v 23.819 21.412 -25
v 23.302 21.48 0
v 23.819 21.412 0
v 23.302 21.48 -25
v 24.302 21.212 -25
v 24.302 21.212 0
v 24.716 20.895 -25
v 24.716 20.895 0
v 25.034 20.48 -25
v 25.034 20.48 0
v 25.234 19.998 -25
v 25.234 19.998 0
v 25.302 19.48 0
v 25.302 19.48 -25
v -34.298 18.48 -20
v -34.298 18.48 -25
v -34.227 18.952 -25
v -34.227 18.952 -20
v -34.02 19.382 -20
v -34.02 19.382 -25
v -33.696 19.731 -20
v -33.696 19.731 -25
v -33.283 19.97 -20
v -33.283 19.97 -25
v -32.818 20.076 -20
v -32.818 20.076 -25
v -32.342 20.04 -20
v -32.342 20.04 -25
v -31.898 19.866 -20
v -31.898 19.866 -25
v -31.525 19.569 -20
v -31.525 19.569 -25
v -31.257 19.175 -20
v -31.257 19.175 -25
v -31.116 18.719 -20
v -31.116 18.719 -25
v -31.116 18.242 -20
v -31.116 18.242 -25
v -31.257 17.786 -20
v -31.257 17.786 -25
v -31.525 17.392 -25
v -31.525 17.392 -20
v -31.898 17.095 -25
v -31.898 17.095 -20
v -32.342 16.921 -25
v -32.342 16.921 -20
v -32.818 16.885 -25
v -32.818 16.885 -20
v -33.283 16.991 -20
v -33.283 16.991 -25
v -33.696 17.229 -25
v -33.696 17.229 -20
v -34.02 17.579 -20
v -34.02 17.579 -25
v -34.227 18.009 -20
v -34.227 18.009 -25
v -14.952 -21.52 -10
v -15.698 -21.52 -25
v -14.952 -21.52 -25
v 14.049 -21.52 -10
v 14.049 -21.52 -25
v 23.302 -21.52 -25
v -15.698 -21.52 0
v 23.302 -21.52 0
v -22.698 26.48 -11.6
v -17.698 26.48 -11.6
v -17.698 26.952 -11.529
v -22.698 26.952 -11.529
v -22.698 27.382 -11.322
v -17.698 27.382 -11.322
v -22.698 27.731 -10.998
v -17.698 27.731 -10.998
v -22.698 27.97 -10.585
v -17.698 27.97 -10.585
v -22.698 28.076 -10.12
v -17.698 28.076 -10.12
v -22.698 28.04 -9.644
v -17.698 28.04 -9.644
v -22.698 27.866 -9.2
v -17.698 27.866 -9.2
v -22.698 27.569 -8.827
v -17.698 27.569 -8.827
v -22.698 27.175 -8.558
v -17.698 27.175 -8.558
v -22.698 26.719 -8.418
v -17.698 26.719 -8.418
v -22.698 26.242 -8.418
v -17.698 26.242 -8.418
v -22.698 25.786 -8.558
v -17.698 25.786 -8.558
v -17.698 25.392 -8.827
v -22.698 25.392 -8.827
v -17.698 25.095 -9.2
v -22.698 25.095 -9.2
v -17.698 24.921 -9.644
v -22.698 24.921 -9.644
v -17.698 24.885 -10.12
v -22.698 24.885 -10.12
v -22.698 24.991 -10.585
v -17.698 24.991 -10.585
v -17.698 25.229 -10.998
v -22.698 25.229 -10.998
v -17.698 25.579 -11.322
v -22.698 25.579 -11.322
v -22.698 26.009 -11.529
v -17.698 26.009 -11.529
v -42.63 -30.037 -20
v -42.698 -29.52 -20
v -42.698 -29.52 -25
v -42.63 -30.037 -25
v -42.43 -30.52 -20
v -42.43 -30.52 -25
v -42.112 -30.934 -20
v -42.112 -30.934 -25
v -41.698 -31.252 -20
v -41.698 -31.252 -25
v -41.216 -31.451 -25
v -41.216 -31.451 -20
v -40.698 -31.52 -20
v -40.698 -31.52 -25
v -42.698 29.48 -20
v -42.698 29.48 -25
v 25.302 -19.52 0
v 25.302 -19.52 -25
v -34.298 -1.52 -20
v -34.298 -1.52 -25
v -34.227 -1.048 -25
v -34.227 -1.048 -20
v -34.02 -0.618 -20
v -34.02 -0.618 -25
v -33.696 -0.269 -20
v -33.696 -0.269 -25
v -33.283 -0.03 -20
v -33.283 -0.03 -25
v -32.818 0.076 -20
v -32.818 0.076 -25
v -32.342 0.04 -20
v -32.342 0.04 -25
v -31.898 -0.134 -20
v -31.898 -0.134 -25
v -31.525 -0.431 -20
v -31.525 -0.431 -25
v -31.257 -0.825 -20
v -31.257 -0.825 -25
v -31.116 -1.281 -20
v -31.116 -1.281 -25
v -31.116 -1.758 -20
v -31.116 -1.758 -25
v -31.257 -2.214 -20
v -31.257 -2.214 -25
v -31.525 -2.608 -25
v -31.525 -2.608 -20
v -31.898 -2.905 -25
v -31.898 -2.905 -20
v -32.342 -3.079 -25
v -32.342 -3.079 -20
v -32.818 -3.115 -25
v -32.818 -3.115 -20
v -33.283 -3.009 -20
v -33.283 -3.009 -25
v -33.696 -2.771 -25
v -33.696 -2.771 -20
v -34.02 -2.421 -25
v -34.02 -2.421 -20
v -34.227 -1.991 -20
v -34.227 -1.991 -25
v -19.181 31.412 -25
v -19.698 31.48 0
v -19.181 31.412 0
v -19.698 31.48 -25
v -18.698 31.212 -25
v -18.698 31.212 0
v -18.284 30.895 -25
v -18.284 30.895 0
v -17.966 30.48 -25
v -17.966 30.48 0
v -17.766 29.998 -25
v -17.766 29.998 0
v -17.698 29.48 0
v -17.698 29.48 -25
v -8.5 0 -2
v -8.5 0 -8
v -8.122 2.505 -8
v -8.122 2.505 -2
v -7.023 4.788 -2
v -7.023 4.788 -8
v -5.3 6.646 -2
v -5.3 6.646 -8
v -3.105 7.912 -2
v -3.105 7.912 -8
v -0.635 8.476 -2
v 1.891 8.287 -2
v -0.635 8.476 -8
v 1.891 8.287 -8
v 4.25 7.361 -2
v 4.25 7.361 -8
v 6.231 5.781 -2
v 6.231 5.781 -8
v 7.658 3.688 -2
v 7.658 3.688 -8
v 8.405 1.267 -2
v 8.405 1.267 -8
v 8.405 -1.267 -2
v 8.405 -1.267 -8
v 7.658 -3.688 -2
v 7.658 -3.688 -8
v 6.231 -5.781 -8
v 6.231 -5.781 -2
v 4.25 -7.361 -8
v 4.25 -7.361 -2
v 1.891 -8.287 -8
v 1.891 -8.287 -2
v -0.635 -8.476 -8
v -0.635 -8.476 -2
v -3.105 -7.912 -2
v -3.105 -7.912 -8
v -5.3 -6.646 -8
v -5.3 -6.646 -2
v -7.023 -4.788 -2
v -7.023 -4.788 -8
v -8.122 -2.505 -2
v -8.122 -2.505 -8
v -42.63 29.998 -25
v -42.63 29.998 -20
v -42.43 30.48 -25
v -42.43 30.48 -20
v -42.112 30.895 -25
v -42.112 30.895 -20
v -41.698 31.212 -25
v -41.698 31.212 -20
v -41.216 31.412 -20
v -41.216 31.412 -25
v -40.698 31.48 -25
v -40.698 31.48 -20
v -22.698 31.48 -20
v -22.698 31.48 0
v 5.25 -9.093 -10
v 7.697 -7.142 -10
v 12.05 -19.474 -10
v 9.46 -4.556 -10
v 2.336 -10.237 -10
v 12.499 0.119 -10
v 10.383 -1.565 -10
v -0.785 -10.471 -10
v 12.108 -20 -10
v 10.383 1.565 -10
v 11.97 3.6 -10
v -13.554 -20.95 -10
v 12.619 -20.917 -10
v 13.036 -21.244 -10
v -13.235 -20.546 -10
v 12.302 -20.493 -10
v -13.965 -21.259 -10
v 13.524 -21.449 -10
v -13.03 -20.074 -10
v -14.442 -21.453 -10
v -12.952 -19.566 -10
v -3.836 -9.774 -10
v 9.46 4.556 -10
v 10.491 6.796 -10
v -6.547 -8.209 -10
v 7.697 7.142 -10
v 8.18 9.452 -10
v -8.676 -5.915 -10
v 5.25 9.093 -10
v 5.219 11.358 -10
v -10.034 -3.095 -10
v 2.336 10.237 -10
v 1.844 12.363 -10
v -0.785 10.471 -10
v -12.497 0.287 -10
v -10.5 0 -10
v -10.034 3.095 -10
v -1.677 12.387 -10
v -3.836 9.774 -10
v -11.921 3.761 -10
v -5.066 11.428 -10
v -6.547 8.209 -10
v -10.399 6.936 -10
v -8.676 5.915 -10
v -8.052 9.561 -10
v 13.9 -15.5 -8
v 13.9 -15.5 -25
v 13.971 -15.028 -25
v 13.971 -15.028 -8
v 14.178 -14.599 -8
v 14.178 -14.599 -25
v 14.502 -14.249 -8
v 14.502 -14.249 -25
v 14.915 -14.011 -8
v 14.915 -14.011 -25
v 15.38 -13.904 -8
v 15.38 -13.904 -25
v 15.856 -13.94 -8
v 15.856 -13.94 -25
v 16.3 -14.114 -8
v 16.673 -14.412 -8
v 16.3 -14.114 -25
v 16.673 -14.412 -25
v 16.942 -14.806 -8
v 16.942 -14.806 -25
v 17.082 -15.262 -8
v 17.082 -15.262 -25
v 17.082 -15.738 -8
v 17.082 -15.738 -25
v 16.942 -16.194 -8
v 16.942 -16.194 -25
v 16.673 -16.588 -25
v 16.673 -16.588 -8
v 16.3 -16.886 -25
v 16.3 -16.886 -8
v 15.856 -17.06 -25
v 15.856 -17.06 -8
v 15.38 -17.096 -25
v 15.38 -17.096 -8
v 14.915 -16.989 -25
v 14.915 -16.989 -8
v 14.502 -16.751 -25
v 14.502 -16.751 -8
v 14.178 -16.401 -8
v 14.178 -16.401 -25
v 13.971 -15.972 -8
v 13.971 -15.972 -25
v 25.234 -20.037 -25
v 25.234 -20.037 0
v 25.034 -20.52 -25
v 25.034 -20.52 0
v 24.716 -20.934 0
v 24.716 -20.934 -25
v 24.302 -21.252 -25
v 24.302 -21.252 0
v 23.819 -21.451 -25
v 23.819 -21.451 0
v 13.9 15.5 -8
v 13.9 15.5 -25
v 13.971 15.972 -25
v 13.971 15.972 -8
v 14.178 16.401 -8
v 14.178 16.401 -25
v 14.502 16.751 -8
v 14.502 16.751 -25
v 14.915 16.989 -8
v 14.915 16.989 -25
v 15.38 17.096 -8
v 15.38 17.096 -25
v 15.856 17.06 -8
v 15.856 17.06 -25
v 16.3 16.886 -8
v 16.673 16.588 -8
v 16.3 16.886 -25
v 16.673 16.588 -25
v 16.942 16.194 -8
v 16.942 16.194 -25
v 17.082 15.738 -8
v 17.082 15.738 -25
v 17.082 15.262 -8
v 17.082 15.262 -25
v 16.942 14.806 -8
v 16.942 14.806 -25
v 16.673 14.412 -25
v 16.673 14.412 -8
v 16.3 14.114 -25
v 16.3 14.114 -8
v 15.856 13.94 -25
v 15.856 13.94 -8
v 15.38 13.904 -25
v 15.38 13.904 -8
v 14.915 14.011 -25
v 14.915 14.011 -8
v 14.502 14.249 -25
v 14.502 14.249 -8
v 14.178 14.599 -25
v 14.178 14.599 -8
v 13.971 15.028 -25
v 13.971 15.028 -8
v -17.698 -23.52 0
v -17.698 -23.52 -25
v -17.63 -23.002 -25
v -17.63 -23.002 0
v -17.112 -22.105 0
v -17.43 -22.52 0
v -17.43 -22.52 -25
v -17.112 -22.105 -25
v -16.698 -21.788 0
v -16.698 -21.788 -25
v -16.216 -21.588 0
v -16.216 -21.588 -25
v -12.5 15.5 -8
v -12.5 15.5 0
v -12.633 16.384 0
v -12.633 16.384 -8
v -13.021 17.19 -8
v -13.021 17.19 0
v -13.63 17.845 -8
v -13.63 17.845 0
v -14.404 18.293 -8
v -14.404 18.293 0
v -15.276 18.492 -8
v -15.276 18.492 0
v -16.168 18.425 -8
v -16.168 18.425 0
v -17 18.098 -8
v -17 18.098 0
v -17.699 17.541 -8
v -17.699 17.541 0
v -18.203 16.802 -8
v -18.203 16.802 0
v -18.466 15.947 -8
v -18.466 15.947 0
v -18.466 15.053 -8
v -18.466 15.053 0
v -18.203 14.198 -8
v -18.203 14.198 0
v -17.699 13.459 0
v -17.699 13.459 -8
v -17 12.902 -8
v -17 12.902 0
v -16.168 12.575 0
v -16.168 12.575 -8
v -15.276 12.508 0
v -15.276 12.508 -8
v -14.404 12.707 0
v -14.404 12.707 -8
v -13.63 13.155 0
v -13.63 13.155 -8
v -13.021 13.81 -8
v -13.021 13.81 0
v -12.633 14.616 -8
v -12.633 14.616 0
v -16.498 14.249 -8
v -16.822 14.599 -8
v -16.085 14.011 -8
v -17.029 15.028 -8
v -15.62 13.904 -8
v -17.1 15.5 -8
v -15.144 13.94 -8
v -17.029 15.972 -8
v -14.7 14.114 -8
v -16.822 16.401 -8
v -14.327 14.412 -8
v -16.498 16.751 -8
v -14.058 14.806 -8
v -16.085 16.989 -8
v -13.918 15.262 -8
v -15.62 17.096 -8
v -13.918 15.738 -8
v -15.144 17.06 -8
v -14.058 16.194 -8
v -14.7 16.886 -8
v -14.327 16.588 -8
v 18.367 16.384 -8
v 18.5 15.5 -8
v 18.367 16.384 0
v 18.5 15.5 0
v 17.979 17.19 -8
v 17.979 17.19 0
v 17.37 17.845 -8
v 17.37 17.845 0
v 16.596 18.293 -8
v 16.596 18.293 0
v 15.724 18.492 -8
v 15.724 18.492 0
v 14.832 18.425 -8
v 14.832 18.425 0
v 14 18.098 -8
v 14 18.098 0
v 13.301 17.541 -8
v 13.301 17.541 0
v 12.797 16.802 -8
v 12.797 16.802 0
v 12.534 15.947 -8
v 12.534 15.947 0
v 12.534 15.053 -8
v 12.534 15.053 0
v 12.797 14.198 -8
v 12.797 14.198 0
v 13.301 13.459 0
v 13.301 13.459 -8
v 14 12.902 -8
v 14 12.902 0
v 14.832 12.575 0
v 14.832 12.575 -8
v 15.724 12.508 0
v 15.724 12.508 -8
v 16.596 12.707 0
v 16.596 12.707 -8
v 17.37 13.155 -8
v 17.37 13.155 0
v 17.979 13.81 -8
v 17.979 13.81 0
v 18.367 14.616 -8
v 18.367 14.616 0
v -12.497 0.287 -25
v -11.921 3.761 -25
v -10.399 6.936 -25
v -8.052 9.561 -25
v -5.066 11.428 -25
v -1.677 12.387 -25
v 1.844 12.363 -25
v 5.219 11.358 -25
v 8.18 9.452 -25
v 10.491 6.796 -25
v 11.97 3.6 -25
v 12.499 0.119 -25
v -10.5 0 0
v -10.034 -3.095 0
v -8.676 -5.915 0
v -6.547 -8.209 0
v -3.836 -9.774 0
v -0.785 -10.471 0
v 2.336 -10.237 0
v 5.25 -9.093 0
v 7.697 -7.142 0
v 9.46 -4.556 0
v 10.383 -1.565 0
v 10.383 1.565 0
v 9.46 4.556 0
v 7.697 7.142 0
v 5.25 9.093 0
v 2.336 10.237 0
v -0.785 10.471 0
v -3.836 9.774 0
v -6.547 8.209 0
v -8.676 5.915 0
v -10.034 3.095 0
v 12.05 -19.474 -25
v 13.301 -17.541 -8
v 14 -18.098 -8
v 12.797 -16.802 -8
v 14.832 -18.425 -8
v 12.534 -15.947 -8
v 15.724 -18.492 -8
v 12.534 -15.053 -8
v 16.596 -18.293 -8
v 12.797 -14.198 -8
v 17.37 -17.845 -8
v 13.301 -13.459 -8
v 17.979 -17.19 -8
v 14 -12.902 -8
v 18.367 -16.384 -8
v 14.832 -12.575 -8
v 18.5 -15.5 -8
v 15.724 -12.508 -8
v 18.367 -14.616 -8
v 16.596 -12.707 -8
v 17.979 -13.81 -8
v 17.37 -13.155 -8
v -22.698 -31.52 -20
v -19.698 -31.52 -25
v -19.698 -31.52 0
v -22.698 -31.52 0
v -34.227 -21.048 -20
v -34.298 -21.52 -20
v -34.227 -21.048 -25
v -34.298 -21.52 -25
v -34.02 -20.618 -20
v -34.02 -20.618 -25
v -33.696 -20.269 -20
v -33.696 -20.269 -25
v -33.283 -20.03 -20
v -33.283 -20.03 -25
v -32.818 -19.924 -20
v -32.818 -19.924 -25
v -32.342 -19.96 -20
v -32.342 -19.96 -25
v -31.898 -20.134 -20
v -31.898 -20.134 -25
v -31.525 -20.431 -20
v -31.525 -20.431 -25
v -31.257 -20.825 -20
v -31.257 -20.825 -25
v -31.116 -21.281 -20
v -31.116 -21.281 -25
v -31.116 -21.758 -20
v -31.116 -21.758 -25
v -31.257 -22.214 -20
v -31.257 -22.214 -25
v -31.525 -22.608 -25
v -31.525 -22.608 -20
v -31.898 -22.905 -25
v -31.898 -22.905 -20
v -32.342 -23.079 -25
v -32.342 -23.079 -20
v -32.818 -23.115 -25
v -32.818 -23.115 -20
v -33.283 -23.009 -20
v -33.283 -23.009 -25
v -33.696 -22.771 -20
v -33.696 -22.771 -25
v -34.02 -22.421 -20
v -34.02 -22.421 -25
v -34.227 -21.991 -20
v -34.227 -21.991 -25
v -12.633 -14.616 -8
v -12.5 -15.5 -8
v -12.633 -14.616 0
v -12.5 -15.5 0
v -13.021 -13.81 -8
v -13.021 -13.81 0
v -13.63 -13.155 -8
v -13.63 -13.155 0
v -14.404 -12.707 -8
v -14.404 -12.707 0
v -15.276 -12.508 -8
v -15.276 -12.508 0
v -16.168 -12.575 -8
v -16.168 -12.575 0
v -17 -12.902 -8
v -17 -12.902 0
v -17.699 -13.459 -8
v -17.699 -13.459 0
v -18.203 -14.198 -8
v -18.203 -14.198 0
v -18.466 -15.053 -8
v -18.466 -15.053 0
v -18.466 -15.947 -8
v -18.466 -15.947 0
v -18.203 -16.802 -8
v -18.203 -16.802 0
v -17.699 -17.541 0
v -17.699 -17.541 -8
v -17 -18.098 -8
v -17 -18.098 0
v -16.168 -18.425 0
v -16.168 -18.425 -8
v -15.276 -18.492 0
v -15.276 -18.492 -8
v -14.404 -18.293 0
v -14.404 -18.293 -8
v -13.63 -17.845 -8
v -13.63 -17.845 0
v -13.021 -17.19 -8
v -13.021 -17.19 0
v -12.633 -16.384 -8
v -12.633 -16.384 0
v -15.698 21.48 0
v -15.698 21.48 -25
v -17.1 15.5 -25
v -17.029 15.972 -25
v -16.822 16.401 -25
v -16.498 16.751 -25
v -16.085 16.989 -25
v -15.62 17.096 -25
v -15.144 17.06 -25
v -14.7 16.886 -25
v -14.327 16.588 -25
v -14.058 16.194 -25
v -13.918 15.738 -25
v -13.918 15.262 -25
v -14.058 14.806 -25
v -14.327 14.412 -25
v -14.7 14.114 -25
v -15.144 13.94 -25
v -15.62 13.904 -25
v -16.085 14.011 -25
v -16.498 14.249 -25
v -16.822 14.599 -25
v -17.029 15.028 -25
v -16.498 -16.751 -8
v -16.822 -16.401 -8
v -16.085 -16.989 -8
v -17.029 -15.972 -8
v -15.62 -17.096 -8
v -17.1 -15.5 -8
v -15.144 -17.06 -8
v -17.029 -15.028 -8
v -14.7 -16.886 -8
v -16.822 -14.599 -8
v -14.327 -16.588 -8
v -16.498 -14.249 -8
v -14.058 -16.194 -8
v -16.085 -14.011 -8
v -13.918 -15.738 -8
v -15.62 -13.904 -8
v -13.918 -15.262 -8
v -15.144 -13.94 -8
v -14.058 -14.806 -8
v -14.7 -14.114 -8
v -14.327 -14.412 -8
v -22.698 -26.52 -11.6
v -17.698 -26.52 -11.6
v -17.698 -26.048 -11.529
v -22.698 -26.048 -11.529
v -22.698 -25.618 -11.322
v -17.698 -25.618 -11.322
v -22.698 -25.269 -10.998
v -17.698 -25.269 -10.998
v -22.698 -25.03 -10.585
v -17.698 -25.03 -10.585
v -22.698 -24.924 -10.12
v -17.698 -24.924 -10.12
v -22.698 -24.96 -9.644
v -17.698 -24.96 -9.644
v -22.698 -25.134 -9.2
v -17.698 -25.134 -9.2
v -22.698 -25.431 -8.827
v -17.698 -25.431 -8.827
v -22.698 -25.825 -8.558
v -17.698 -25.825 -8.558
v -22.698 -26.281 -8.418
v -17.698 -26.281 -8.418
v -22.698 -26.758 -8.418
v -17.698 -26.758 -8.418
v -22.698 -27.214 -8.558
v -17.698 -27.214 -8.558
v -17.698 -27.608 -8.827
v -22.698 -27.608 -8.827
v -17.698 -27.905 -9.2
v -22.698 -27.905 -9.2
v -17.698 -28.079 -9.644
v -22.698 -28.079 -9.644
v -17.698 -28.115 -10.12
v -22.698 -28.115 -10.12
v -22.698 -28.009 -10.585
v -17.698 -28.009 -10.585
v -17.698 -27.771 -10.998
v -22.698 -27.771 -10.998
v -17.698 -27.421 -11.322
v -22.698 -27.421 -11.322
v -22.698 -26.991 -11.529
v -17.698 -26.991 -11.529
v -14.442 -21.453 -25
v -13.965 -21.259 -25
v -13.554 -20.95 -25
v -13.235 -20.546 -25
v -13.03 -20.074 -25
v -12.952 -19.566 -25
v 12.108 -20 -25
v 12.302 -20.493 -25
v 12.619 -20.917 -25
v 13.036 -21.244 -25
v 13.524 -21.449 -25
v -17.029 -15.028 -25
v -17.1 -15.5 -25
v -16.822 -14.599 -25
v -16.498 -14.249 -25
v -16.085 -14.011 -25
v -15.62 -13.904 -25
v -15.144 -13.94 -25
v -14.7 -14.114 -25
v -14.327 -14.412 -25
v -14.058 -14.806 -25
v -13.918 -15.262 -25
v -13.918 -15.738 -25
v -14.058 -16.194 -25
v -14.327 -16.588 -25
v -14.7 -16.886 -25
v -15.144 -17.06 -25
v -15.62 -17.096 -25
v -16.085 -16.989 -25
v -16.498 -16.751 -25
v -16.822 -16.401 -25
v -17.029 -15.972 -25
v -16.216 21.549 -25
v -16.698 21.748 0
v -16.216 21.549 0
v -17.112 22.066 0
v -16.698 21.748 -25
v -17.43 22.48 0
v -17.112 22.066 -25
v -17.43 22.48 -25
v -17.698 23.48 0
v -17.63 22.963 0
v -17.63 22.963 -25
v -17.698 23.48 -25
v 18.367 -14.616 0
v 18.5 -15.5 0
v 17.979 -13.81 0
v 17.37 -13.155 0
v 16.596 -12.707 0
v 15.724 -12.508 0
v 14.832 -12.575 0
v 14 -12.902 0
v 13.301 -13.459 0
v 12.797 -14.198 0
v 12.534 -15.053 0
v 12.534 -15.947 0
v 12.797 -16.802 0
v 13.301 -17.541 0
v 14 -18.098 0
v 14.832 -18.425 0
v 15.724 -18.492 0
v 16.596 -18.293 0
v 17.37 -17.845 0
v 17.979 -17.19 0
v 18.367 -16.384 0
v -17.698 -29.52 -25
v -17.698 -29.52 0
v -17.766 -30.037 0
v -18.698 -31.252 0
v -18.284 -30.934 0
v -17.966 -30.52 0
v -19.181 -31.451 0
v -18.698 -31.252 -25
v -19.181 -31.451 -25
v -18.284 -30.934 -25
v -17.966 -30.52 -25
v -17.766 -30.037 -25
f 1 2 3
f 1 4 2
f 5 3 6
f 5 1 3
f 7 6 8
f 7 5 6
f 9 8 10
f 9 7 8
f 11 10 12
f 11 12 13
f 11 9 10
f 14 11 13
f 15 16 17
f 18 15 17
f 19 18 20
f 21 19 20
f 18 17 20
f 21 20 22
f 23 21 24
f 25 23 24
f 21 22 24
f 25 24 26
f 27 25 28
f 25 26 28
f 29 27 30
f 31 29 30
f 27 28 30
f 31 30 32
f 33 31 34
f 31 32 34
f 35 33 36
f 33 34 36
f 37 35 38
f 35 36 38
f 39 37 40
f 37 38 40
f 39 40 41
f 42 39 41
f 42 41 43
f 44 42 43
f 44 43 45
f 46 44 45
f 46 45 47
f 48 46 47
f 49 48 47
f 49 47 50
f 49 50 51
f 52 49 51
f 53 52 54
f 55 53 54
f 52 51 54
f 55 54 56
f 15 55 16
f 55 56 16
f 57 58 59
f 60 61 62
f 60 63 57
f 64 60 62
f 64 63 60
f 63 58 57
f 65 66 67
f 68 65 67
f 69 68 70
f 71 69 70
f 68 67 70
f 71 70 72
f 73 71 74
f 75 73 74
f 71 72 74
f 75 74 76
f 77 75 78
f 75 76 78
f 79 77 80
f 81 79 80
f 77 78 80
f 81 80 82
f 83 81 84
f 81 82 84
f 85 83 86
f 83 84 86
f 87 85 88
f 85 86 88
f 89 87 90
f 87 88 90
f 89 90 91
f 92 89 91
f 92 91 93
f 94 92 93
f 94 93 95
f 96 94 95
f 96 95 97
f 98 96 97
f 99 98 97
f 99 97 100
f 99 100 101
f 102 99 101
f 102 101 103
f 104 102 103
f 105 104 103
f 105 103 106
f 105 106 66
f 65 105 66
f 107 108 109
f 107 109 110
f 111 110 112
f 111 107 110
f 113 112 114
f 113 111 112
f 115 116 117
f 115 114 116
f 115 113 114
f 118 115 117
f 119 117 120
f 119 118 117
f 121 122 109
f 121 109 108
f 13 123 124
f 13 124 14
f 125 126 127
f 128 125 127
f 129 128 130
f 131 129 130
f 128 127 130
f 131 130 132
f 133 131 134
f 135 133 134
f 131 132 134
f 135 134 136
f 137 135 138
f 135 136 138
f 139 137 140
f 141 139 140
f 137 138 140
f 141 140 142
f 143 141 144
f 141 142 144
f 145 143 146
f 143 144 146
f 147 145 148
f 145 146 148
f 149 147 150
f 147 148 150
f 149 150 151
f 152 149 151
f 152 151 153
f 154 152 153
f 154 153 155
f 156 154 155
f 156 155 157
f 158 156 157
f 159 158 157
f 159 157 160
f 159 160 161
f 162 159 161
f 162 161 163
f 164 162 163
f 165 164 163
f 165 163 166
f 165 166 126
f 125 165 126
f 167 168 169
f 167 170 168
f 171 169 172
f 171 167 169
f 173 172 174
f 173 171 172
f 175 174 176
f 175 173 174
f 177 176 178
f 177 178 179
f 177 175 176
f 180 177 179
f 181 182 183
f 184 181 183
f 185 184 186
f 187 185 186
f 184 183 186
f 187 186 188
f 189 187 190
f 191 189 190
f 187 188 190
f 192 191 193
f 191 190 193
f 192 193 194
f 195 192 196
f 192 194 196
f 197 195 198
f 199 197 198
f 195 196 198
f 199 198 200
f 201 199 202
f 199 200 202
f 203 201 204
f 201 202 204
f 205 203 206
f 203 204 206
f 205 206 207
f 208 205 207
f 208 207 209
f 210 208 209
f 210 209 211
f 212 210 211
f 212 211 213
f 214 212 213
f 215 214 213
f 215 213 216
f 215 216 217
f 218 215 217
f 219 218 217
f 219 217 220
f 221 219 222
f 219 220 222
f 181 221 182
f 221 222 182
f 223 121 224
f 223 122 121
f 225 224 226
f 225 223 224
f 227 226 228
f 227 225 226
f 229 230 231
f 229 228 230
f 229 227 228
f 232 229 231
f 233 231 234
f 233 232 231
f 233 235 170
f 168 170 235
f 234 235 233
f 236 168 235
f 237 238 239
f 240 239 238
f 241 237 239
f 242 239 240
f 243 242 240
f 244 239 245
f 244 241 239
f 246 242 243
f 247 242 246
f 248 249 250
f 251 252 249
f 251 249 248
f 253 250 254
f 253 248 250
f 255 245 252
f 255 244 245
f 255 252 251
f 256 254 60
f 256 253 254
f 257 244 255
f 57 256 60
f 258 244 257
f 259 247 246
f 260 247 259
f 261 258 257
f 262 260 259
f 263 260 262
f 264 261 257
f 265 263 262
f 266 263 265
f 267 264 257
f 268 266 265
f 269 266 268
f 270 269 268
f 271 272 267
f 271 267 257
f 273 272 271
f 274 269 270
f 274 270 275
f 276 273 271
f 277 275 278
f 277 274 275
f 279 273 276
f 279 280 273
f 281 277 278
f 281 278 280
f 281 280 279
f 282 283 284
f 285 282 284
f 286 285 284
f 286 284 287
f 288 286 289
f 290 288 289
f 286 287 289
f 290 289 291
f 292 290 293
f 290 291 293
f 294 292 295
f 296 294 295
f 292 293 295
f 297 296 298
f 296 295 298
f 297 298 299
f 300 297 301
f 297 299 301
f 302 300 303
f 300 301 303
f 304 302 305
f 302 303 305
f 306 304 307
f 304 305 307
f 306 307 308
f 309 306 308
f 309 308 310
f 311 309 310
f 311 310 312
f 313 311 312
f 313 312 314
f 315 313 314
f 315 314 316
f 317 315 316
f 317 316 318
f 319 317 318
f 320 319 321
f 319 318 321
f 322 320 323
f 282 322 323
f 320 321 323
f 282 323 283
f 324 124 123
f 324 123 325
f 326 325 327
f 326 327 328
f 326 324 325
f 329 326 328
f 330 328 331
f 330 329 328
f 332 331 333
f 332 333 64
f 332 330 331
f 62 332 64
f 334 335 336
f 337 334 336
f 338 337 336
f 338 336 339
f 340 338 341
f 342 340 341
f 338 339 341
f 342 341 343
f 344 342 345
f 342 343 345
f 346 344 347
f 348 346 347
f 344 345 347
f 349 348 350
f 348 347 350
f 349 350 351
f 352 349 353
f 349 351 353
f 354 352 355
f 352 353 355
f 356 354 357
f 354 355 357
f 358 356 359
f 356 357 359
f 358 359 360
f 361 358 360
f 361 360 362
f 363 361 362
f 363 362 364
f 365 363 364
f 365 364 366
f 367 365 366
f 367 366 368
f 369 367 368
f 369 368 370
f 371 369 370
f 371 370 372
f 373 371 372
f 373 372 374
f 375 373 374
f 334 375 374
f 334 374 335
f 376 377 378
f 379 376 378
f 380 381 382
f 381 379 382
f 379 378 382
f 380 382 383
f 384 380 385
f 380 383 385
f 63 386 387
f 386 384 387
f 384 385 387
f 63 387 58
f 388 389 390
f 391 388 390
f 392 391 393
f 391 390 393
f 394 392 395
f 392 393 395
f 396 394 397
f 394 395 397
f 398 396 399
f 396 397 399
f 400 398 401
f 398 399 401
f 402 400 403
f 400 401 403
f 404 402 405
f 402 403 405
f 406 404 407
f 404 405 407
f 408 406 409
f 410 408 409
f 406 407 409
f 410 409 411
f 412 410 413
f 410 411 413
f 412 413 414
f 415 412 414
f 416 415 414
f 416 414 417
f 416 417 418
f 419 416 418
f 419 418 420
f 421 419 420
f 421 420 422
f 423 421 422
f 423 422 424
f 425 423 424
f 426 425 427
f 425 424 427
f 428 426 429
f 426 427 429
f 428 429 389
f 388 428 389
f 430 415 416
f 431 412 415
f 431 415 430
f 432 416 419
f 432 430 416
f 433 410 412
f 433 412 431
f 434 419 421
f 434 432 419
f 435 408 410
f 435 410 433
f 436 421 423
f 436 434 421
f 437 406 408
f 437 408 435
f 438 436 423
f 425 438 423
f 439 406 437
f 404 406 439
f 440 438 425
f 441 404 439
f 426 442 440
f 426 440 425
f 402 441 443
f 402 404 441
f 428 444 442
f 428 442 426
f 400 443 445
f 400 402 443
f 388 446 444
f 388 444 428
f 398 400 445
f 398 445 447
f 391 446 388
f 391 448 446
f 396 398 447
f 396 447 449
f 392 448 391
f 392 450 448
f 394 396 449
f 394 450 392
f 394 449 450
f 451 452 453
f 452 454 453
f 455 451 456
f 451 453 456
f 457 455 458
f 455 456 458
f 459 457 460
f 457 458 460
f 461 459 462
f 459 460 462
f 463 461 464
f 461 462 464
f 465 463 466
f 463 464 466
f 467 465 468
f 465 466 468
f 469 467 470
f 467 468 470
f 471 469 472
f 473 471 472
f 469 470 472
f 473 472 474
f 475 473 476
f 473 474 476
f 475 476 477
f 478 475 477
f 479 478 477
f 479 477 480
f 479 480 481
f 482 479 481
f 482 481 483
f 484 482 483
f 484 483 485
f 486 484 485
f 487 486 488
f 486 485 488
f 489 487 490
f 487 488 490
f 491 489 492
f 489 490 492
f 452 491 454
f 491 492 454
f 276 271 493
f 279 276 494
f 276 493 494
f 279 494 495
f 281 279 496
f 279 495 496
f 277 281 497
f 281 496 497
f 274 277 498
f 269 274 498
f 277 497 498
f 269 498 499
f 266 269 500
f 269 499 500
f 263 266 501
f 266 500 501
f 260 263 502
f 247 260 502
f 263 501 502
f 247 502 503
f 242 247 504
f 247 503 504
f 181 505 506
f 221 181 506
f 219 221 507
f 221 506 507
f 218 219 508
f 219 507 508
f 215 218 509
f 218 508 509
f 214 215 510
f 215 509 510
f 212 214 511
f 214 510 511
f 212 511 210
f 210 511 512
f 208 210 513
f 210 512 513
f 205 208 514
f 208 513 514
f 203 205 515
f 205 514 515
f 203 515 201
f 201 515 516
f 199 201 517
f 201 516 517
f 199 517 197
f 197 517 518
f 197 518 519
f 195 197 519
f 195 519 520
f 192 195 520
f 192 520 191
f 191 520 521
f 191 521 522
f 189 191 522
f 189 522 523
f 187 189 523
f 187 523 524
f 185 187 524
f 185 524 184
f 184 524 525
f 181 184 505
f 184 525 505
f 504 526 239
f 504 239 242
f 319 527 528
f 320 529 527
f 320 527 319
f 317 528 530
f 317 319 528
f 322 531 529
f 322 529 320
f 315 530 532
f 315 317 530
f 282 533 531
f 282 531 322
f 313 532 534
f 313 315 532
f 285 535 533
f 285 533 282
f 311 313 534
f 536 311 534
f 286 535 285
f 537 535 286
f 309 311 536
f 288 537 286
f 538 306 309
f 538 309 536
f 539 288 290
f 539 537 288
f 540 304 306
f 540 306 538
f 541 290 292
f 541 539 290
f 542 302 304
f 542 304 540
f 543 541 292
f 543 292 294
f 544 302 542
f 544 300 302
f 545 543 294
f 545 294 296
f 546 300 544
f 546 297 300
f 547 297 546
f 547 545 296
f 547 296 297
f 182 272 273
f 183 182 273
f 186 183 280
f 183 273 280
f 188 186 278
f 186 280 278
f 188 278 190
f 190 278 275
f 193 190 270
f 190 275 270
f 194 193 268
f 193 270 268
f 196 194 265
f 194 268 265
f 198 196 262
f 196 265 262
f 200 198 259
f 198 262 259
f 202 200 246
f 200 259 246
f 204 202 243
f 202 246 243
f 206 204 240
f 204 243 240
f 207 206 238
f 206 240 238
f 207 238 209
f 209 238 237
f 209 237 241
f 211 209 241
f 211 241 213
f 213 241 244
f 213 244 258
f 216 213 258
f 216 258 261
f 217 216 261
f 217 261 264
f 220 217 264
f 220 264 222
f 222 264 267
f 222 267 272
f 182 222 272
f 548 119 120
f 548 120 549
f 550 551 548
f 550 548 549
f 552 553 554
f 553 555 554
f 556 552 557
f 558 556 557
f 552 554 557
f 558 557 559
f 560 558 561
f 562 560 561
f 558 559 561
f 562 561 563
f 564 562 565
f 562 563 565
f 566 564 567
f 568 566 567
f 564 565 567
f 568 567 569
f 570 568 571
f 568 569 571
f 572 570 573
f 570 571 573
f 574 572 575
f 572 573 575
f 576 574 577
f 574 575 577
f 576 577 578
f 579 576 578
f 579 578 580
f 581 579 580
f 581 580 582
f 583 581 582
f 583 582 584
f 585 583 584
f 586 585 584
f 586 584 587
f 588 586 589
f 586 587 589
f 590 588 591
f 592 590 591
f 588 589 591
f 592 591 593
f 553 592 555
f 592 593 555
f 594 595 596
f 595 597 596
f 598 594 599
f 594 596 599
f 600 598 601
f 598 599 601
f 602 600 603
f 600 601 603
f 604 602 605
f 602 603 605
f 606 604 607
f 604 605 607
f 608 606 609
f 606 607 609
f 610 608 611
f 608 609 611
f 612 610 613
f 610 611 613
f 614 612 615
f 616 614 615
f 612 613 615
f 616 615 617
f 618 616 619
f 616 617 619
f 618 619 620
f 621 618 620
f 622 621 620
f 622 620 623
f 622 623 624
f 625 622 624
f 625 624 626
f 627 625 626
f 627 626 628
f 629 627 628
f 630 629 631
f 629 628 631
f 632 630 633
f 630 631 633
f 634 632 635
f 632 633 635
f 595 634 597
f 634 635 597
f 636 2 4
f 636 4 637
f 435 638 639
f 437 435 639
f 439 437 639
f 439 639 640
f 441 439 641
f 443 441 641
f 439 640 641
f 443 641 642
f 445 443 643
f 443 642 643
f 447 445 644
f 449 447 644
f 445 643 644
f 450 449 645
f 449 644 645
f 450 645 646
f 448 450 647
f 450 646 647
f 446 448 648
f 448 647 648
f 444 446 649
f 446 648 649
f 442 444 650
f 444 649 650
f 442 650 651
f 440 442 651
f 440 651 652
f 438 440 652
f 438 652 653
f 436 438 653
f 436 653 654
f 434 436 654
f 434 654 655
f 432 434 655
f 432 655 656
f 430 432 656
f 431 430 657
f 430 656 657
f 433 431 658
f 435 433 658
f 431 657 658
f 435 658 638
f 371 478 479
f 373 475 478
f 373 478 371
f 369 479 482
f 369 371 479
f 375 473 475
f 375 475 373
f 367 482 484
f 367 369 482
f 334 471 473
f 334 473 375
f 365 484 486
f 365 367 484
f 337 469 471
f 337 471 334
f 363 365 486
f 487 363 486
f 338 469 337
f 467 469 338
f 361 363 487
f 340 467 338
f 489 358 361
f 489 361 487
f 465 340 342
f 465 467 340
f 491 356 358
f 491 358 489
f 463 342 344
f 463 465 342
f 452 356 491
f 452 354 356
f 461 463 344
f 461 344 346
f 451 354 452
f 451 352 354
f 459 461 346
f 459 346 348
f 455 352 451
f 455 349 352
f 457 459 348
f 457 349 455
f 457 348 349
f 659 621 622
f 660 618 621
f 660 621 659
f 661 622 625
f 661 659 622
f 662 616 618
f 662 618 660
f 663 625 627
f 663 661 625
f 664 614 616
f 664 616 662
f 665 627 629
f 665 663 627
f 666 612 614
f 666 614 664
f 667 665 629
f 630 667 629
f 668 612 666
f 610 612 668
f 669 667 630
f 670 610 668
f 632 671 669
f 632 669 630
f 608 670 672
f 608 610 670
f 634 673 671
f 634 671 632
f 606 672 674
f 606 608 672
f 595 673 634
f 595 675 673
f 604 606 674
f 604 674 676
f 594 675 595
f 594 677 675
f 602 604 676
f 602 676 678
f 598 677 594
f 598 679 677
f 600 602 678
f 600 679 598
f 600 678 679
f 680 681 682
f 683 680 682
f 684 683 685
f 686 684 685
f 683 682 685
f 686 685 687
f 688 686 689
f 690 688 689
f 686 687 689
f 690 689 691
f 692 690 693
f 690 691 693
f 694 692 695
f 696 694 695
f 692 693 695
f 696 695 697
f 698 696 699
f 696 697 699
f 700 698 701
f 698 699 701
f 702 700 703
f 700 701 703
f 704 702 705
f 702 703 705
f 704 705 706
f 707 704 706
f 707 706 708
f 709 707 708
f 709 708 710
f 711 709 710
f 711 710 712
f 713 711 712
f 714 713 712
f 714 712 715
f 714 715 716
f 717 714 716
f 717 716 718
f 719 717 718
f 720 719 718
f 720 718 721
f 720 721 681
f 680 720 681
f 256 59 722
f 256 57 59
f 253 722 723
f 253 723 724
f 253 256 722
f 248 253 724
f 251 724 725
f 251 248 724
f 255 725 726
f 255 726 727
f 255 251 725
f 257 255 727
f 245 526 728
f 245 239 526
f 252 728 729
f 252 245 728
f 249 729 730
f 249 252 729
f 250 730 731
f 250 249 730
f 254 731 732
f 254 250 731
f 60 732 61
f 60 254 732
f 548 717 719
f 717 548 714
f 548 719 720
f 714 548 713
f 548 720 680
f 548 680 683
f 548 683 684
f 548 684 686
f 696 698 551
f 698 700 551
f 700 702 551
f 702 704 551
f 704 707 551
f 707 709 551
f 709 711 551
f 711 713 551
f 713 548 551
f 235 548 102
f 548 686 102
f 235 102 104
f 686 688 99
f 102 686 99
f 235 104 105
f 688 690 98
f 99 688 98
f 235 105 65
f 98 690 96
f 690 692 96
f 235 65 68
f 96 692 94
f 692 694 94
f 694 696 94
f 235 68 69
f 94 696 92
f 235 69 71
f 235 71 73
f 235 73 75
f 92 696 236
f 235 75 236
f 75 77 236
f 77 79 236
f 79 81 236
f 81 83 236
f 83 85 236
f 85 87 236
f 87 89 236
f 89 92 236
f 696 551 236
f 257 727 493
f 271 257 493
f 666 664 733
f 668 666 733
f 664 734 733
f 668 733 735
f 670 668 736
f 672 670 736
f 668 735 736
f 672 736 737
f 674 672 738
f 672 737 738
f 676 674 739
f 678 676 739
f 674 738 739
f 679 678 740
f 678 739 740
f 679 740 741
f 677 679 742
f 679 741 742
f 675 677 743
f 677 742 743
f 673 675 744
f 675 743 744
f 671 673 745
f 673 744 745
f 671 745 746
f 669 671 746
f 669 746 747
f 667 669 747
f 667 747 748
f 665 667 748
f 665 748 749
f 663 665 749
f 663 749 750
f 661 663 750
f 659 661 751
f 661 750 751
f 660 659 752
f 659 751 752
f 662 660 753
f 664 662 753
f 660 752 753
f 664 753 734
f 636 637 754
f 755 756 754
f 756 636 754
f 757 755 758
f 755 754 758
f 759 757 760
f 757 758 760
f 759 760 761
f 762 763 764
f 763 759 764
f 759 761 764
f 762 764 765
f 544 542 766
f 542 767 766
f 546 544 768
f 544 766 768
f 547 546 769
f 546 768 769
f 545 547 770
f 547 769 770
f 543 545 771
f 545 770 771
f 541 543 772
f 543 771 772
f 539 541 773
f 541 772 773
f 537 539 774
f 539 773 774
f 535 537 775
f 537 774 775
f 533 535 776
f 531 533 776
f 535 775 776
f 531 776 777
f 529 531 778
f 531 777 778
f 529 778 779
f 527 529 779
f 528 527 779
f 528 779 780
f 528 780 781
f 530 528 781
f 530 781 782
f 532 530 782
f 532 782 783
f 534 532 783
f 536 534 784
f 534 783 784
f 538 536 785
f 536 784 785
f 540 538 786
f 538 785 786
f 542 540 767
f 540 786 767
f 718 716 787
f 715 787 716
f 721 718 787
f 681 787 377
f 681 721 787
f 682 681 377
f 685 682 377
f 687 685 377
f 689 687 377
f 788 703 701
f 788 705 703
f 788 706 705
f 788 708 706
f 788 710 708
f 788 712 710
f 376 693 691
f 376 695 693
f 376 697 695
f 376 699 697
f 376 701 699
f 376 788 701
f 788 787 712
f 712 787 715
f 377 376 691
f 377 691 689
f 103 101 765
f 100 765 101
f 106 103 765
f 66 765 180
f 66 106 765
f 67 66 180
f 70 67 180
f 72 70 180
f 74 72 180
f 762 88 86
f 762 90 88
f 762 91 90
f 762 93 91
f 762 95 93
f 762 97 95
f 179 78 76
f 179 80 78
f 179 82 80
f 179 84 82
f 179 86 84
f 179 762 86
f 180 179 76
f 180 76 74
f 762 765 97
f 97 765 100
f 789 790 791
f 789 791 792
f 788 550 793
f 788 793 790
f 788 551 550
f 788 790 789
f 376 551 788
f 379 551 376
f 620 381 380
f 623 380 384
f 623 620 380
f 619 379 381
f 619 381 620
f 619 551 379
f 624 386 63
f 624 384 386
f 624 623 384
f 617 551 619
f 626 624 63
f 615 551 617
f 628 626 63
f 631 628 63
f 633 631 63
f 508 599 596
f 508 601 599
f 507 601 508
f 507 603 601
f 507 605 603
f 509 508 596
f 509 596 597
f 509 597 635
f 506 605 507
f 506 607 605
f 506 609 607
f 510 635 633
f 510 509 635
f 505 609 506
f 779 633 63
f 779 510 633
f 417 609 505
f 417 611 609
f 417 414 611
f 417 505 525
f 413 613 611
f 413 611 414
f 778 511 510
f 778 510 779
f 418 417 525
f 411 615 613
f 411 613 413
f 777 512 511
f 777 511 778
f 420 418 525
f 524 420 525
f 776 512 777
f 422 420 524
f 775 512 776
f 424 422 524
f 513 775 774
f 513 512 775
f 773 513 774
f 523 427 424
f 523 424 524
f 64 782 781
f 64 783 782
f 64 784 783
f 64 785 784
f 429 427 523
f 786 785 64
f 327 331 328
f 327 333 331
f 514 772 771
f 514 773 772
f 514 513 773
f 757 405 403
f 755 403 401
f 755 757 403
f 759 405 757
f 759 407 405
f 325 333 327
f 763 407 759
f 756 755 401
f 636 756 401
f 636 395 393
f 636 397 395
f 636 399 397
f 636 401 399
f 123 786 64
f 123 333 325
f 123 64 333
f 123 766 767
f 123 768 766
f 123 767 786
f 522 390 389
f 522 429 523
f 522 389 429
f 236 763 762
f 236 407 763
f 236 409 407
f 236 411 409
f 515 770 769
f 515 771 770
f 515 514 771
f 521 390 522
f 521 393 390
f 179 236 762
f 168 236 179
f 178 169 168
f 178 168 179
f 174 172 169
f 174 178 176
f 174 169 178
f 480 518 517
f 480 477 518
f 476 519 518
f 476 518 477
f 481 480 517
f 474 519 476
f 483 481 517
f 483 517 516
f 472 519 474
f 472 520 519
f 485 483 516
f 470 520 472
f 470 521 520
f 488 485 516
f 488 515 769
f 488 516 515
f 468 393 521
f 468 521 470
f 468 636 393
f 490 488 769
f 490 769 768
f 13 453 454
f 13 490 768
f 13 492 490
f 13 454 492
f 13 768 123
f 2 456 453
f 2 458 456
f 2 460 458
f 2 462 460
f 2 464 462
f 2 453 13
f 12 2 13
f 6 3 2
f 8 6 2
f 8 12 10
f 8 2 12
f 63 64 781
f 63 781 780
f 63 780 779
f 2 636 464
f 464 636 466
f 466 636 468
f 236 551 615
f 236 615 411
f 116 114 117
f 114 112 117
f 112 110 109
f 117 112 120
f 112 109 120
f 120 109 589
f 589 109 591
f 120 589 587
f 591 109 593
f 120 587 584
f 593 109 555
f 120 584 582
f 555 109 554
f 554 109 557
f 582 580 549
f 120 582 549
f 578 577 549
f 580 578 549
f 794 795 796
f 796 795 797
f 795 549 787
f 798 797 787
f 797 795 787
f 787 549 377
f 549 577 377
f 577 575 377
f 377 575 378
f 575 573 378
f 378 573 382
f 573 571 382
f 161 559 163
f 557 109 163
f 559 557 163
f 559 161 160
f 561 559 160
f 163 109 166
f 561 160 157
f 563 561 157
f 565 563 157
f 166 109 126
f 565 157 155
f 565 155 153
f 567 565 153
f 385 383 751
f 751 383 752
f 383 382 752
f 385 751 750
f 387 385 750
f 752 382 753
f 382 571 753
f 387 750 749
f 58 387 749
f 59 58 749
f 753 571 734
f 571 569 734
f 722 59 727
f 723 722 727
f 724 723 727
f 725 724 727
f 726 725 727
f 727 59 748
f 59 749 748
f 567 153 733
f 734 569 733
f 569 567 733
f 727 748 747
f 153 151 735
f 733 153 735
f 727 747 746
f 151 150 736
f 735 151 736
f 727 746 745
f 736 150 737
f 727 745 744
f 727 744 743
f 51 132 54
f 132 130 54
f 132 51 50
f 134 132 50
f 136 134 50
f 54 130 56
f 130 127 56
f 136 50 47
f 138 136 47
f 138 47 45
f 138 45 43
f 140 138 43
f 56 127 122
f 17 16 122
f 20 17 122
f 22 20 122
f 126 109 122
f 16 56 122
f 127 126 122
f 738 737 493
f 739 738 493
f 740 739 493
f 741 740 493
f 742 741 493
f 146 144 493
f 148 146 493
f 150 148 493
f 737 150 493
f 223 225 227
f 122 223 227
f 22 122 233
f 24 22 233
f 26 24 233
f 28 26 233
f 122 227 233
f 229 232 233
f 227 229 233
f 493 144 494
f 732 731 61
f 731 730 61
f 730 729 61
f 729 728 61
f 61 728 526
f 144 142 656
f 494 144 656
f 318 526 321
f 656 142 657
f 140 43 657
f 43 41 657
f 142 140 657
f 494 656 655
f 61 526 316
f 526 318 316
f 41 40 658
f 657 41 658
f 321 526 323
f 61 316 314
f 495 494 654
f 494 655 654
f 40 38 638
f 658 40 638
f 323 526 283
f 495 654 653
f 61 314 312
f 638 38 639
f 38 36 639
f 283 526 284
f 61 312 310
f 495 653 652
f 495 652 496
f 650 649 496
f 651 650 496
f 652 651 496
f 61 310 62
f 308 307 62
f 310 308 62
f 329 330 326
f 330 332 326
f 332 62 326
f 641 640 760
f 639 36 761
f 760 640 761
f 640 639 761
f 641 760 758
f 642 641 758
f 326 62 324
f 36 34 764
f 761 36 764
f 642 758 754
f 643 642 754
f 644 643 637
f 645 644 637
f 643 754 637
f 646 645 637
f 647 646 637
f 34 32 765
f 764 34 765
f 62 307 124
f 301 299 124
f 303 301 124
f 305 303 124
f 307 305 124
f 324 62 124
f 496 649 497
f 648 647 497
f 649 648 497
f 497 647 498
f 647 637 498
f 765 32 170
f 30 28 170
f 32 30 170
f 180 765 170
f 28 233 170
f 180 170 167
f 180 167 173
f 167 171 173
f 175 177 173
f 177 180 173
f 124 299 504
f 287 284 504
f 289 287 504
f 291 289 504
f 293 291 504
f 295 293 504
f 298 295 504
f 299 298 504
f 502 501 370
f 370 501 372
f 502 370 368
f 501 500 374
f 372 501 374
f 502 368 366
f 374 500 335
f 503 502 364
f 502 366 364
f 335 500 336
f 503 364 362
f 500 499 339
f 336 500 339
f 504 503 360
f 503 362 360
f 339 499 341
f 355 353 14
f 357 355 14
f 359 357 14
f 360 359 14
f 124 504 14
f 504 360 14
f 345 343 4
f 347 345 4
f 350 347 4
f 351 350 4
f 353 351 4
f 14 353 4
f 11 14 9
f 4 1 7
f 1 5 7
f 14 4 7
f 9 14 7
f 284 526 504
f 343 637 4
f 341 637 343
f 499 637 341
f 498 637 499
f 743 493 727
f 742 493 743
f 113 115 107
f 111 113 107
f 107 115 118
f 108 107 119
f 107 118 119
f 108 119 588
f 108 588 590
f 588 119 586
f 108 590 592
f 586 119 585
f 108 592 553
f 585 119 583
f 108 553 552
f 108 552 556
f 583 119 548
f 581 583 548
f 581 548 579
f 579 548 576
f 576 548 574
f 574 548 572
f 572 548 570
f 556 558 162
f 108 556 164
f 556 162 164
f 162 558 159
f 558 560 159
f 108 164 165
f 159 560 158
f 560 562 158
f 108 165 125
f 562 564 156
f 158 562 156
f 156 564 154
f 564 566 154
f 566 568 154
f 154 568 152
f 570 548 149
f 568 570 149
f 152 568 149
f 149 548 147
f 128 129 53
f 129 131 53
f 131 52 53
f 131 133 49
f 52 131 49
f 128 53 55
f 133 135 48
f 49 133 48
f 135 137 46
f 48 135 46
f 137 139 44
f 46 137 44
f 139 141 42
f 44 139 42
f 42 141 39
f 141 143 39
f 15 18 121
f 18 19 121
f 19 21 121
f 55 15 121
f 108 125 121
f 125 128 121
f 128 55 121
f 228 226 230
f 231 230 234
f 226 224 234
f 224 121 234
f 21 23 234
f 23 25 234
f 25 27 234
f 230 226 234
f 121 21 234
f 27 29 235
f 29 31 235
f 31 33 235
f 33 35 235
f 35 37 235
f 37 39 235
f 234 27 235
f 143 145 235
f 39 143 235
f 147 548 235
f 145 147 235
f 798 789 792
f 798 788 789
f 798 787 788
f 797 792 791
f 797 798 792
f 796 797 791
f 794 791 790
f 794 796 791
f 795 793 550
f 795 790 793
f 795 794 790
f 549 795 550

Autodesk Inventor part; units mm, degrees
ref_plane "YZ Plane" through (0, 0, 0) normal (1, 0, 0) x (0, 1, 0)
ref_plane "XZ Plane" through (0, 0, 0) normal (0, 1, 0) x (-1, 0, 0)
ref_plane "XY Plane" through (0, 0, 0) normal (0, 0, 1) x (1, 0, 0)
sketch "Skizze1" plane through (0, 0, 0) normal (0, 0, 1) x (1, 0, 0)
  line L0 (-22.6982, -31.5196) -> (-17.6982, -31.5196)
  line L1 (-17.6982, -31.5196) -> (-17.6982, -21.5196)
  line L2 (-17.6982, -21.5196) -> (25.3018, -21.5196)
  line L3 (25.3018, -21.5196) -> (25.3018, 21.4804)
  line L4 (25.3018, 21.4804) -> (-17.6982, 21.4804)
  line L5 (-17.6982, 21.4804) -> (-17.6982, 31.4804)
  line L6 (-17.6982, 31.4804) -> (-22.6982, 31.4804)
  line L7 (-22.6982, -31.5196) -> (-22.6982, 31.4804)
  point P0 (0, 0)
  dimension "d0" = 5
  dimension "d1" = 10
  dimension "d2" = 43
  dimension "d3" = 43
  dimension "d4" = 10
  dimension "d5" = 5
extrude "Extrusion1" add sketch "Skizze1" against normal blind 25
sketch "Skizze2" plane through (-22.6982, -31.5196, 0) normal (-1, 0, 0) x (0, 0, 1)
  line L0 (-25, 0) -> (-25, 63) projected
  line L1 (0, 63) -> (-25, 63) projected
  line L2 (-25, 0) -> (-20, 0)
  line L3 (-20, 0) -> (-20, 63)
  line L4 (-20, 63) -> (-25, 63)
  line L5 (-25, 63) -> (-25, 0)
  point P0 (0, 31.5196)
  dimension "d8" = 5
extrude "Extrusion2" add sketch "Skizze2" along normal blind 20
sketch "Skizze3" plane through (0, 0, -25) normal (0, 0, -1) x (-1, 0, 0)
  line L0 (12.9973, -21.5196) -> (-12.0027, -21.5196)
  line L1 (12.9973, -21.5196) -> (12.4967, 0.2869)
  line L2 (-12.0027, -21.5196) -> (-12.4994, 0.1188)
  arc A0 (12.4967, 0.2869) -> (-12.4994, 0.1188) centre (0, 0) ccw
  dimension "d12" = 25
extrude "Extrusion3" cut sketch "Skizze3" against normal blind 15
sketch "Skizze4" plane through (0, 0, -25) normal (0, 0, -1) x (-1, 0, 0)
  circle A0 centre (32.6982, -21.5196) radius 1.6
  line L0 (42.6982, 31.4804) -> (42.6982, -31.5196) projected
  line L1 (17.6982, -31.5196) -> (42.6982, -31.5196) projected
  circle A1 centre (32.6982, -1.5196) radius 1.6
  circle A2 centre (32.6982, 18.4804) radius 1.6
  point P0 (0, 0)
  dimension "d16" = 3.2
  dimension "d17" = 10
  dimension "d18" = 10
  dimension "d21" = 20
extrude "Extrusion4" cut sketch "Skizze4" against normal through all
fillet "Rundung1" radius 2 10 edges at (25.3018, -21.5196, -12.5) (-17.6982, -21.5196, -12.5) (25.3018, 21.4804, -12.5) (-17.6982, 21.4804, -12.5) (-17.6982, 31.4804, -12.5) (-17.6982, -31.5196, -12.5) (-42.6982, -31.5196, -22.5) (-42.6982, 31.4804, -22.5) (-12.9973, -21.5196, -17.5) (12.0027, -21.5196, -17.5)
sketch "Skizze5" plane through (0, 0, -25) normal (0, 0, -1) x (-1, 0, 0)
  circle A0 centre (15.5, -15.5) radius 1.6
  circle A1 centre (-15.5, -15.5) radius 1.6
  circle A2 centre (15.5, 15.5) radius 1.6
  circle A3 centre (-15.5, 15.5) radius 1.6
  point P0 (0, 0)
  dimension "d29" = 3.2
  dimension "d30" = 15.5
  dimension "d31" = 15.5
  dimension "d32" = 3.2
  dimension "d33" = 31
  dimension "d34" = 3.2
  dimension "d35" = 3.2
  dimension "d36" = 31
  dimension "d37" = 31
  dimension "d38" = 31
extrude "Extrusion5" cut sketch "Skizze5" against normal through all
sketch "Skizze6" plane through (-17.6982, 23.4804, 0) normal (1, 0, 0) x (0, 0, -1)
  circle A0 centre (10, 3) radius 1.6
  line L0 (0, 0) -> (0, 6) projected
  line L1 (25, 8) -> (0, 8) projected
  circle A1 centre (10, -50) radius 1.6
  line L2 (0, -55) -> (25, -55) projected
  line L3 (0, -53) -> (0, -47) projected
  point P0 (0, -23.4804)
  dimension "d41" = 3.2
  dimension "d42" = 10
  dimension "d43" = 5
  dimension "d44" = 3.2
  dimension "d45" = 5
  dimension "d46" = 10
extrude "Extrusion6" cut sketch "Skizze6" against normal through all
sketch "Skizze7" plane through (0, 0, 0) normal (0, 0, 1) x (1, 0, 0)
  circle A0 centre (15.5, -15.5) radius 1.6 projected
  circle A1 centre (-15.5, -15.5) radius 1.6 projected
  circle A2 centre (-15.5, 15.5) radius 1.6 projected
  circle A3 centre (15.5, 15.5) radius 1.6 projected
  circle A4 centre (15.5, -15.5) radius 3
  circle A5 centre (-15.5, -15.5) radius 3
  circle A6 centre (15.5, 15.5) radius 1.6 projected
  circle A7 centre (15.5, 15.5) radius 3
  circle A8 centre (-15.5, 15.5) radius 3
  point P0 (0, 0)
  dimension "d49" = 6
  dimension "d50" = 6
  dimension "d51" = 6
  dimension "d52" = 6
extrude "Extrusion7" cut sketch "Skizze7" against normal blind 8
sketch "Skizze8" plane through (0, 0, -10) normal (0, 0, -1) x (-1, 0, 0)
  circle A0 centre (0, 0) radius 8.5
  dimension "d55" = 17
extrude "Extrusion8" cut sketch "Skizze8" against normal through all
chamfer "Fase1" distance 2 angle 45 2 edges at (8.5, 0, -10) (8.5, 0, 0)
properties part number "Y motor mount" material "ABS-Kunststoff"
